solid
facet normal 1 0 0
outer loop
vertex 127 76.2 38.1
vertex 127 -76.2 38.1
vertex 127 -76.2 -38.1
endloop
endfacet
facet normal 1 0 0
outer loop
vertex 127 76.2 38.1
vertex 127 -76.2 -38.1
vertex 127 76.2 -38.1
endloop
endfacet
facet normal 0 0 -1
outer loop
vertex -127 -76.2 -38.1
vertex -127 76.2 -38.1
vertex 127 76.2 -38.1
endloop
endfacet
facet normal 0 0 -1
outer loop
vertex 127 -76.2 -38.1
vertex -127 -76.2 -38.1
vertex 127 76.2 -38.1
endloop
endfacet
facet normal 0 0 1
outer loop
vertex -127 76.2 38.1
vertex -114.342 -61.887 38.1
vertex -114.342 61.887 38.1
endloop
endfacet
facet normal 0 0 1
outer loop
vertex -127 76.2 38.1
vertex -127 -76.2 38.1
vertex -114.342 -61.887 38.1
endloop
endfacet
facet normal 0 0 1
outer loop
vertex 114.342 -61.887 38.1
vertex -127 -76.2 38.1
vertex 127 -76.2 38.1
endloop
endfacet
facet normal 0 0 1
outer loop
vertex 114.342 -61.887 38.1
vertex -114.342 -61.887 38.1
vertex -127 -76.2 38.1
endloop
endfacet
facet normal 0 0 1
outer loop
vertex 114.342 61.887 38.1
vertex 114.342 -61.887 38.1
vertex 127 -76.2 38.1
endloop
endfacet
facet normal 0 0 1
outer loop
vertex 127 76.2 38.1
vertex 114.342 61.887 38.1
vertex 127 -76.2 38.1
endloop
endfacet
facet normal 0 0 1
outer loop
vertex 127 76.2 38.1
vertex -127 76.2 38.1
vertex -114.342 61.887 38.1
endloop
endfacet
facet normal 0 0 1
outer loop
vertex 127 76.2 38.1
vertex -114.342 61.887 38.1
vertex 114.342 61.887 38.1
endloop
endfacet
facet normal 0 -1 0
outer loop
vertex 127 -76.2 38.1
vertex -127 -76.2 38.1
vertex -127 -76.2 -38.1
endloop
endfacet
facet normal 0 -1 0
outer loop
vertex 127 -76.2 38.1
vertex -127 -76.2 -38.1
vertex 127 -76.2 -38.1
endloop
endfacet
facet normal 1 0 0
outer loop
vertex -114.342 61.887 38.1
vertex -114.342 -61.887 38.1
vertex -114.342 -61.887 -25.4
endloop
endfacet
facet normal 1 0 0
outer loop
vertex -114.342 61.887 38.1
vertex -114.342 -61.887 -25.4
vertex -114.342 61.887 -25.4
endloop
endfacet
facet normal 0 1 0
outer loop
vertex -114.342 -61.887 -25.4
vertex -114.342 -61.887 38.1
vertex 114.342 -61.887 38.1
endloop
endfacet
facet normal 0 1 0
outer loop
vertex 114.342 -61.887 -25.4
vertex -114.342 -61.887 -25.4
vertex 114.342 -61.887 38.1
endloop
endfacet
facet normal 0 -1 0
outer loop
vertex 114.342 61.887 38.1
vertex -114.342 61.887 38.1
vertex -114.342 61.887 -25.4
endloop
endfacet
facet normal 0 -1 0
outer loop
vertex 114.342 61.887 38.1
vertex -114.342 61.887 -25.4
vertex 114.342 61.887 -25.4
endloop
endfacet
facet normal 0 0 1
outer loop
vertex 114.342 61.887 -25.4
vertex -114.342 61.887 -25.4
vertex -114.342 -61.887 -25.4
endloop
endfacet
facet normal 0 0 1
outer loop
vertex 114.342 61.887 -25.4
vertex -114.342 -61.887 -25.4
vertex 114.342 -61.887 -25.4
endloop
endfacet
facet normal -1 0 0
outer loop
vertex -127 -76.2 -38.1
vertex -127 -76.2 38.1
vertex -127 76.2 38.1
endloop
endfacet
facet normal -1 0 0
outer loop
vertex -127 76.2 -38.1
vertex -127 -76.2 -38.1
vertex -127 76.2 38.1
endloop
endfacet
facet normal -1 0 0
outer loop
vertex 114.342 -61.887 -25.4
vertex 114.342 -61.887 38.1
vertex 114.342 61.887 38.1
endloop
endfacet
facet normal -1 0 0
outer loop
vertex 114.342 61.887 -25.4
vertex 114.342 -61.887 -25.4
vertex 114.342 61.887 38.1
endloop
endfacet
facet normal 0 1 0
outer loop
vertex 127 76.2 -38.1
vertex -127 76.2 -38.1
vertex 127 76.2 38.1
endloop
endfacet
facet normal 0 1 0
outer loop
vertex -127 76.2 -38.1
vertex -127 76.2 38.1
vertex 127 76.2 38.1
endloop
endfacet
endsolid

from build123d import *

# Parameters (mm, degrees)
F0_W     = 254
F0_H     = 152.4
F1_DEPTH = 38.1
F2_W     = 228.6844402552
F2_H     = 123.7743124366
F3_DEPTH = 63.5


with BuildPart() as f1:
    # F0 (on Top) → F1 (new body, symmetric)
    with BuildSketch(Plane.XY):
        Rectangle(F0_W, F0_H)
    extrude(amount=F1_DEPTH, both=True)

    # F2 (on face) → F3 (cut)
    with BuildSketch(Plane.XY.offset(38.1)):
        Rectangle(F2_W, F2_H)
    extrude(amount=-F3_DEPTH, mode=Mode.SUBTRACT)


solid = f1.part
